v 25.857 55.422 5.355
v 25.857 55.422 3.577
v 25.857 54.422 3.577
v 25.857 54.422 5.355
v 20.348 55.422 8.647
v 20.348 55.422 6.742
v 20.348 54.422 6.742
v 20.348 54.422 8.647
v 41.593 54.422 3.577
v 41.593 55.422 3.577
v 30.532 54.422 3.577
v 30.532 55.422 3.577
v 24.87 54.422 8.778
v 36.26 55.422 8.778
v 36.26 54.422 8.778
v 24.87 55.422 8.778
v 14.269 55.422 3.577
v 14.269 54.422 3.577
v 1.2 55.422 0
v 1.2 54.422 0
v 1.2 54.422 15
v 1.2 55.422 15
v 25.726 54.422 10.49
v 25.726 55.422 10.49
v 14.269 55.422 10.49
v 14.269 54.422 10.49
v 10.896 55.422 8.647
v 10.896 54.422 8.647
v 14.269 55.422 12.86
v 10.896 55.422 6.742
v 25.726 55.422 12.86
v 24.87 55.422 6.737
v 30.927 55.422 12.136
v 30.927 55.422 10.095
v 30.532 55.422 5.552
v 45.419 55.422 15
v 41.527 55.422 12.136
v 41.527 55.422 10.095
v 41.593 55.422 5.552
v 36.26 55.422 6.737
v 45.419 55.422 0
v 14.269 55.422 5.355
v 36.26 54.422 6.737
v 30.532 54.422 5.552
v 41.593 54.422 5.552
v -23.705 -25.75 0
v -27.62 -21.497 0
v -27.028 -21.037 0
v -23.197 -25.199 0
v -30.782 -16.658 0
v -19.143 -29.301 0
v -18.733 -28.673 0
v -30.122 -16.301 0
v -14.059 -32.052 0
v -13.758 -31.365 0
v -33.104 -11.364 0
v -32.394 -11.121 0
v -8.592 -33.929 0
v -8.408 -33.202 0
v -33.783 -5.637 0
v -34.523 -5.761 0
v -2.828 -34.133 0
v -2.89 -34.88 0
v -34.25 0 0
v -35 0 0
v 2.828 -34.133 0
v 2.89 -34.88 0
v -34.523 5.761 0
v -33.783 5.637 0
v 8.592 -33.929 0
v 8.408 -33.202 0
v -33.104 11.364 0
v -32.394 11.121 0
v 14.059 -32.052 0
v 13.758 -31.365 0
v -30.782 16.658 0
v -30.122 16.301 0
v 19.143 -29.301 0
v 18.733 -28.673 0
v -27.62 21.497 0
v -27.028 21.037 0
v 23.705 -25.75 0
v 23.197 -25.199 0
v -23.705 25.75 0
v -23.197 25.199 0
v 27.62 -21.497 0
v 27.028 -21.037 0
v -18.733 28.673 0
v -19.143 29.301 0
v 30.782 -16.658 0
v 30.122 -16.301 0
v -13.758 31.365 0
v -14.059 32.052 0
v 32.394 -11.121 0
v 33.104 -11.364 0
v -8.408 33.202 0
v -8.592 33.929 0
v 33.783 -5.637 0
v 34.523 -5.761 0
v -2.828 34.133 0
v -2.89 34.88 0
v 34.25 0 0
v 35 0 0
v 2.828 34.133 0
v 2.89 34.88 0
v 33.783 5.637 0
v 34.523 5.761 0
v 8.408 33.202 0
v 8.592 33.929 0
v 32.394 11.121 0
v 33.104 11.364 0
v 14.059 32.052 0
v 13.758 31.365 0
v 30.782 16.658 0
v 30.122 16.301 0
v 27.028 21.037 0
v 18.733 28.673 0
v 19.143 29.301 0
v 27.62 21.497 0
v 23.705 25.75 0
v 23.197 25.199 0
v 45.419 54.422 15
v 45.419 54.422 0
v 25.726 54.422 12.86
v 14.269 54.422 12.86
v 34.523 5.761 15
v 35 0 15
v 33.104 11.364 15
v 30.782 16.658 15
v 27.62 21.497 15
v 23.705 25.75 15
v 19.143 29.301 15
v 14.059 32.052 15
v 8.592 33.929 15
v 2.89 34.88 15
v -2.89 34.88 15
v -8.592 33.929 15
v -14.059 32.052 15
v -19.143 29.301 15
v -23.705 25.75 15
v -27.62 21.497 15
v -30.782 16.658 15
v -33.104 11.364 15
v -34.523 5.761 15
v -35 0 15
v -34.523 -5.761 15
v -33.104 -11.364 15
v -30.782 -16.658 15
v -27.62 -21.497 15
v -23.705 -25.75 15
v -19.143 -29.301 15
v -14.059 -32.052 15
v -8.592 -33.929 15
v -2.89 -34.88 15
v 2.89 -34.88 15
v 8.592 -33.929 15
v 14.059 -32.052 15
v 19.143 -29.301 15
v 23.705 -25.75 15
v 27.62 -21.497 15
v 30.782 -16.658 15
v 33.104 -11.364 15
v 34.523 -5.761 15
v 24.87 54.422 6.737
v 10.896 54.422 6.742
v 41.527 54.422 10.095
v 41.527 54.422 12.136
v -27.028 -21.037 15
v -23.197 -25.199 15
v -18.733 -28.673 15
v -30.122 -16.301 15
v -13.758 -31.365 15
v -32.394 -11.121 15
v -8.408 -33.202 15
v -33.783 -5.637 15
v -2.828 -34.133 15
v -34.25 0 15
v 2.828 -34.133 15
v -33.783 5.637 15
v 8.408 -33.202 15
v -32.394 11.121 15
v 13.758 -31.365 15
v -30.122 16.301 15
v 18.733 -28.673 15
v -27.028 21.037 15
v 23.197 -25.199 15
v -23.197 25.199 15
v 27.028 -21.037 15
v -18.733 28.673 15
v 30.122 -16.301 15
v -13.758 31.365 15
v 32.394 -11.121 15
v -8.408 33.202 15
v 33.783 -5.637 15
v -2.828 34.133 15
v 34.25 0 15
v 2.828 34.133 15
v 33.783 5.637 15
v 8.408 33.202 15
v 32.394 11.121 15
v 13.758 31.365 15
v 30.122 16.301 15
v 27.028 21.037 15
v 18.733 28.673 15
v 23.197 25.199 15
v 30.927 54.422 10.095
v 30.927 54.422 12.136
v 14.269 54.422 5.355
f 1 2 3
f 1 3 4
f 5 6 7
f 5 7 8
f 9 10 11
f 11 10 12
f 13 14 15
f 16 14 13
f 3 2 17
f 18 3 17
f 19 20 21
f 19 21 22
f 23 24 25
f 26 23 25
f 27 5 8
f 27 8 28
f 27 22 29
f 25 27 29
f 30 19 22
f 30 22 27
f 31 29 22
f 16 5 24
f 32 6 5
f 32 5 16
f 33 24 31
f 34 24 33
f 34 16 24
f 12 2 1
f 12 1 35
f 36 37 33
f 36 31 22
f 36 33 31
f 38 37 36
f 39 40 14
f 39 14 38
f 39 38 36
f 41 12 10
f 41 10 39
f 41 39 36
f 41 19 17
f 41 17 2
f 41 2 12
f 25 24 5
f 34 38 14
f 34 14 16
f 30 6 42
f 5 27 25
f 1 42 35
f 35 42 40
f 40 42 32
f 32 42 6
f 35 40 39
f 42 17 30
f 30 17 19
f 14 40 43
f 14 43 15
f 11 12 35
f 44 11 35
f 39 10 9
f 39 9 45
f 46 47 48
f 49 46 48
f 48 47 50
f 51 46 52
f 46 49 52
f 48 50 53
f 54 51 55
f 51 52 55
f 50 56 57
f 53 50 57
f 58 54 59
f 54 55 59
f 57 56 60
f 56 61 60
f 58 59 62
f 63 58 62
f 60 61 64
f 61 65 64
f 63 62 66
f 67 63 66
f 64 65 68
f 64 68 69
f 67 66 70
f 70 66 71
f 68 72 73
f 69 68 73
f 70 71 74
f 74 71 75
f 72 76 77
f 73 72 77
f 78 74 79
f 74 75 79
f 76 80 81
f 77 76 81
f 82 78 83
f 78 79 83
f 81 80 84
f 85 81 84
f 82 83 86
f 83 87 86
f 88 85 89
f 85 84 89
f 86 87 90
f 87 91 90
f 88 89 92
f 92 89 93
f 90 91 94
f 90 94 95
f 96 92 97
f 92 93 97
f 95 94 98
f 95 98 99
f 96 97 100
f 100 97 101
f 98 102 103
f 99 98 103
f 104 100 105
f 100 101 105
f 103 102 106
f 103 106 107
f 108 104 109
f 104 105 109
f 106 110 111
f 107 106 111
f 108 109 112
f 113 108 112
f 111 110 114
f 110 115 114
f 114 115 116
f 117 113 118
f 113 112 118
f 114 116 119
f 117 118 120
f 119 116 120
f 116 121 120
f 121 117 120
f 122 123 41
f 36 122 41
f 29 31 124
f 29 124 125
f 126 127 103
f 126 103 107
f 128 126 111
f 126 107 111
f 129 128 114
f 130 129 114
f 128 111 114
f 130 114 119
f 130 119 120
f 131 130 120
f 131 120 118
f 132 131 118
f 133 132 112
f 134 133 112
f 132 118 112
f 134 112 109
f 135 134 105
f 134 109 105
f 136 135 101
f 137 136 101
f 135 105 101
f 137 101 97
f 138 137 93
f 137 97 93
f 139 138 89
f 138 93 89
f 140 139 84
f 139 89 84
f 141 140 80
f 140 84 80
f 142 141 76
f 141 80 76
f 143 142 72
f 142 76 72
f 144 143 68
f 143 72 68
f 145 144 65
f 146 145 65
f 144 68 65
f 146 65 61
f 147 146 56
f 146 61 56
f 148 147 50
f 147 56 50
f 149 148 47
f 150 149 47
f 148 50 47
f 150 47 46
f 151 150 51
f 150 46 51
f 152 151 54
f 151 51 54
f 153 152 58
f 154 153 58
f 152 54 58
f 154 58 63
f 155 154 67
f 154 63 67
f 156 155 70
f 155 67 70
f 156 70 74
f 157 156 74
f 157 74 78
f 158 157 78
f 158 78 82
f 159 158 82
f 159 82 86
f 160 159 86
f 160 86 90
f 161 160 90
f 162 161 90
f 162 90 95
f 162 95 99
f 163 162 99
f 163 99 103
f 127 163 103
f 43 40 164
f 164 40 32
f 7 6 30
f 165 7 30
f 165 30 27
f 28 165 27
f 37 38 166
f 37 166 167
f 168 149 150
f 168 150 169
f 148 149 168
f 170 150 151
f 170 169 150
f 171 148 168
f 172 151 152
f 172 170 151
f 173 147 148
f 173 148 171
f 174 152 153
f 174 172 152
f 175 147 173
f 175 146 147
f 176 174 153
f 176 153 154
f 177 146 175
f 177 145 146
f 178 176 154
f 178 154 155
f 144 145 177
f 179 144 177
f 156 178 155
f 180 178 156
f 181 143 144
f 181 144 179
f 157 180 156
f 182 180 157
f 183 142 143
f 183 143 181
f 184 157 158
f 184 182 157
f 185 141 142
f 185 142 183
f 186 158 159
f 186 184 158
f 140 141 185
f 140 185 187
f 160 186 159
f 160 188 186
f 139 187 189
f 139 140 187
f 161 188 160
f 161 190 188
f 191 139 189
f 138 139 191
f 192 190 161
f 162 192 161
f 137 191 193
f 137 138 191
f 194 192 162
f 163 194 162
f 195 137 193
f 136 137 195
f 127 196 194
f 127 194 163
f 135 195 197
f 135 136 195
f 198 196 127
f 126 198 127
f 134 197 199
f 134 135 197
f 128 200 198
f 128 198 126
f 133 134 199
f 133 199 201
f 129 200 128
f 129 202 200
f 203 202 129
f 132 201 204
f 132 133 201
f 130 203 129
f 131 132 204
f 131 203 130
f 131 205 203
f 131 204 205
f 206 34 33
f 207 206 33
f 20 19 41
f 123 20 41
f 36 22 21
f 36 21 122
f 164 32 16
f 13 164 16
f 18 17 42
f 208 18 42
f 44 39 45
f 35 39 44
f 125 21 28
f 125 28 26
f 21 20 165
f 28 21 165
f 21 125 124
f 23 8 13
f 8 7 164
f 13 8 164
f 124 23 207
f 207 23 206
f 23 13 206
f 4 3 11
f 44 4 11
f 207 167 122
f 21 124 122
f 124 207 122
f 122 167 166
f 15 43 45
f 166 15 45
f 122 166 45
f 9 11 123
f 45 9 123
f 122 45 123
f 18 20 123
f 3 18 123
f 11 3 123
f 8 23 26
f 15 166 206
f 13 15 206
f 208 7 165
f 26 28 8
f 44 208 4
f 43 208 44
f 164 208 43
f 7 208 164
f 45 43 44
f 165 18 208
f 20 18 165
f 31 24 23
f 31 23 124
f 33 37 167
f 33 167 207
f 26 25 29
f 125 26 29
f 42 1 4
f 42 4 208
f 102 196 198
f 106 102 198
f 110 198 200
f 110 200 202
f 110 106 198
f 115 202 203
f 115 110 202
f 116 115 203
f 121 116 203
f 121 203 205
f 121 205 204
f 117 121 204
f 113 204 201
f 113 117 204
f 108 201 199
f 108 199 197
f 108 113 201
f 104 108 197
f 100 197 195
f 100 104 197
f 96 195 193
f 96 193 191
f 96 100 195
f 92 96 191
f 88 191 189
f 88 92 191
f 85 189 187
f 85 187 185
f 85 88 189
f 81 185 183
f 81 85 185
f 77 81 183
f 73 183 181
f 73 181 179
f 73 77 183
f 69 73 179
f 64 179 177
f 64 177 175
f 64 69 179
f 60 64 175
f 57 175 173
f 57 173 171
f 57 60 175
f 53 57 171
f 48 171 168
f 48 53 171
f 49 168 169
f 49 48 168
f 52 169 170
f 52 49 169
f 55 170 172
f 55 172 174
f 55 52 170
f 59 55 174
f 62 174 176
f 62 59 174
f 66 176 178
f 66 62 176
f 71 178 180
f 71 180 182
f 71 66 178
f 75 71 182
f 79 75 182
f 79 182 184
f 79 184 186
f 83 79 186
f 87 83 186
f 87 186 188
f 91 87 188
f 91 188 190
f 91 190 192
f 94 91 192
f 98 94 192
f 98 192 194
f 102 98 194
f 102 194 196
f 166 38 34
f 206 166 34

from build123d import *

# Parameters (mm, degrees)
F0_R     = 35
F0_R_2   = 34.25
F1_DEPTH = 15
F2_W     = 44.219401
F2_H     = 1
F3_DEPTH = 15
F4_W     = 44.219401
F4_H     = 15
F4_W_2   = 11.061309
F4_H_2   = 1.975235
F4_W_3   = 11.58804
F4_H_3   = 1.777711
F4_W_4   = 10.600423
F4_H_4   = 2.041075
F4_W_5   = 11.390517
F4_W_6   = 9.451392
F4_H_5   = 1.904932
F4_W_7   = 11.456358
F4_H_6   = 2.37028
F5_DEPTH = 2


with BuildPart() as f1:
    # F0 (on Top) → F1 (new body)
    with BuildSketch(Plane.XY):
        Circle(F0_R)
        Circle(F0_R_2, mode=Mode.SUBTRACT)
    extrude(amount=F1_DEPTH)


with BuildPart() as f3:
    # F2 (on Top) → F3 (new body)
    with BuildSketch(Plane.XY):
        with Locations((23.309262, 54.921625)):
            Rectangle(F2_W, F2_H)
    extrude(amount=F3_DEPTH)

    # F4 (on face) → F5 (intersect)
    with BuildSketch(Plane(origin=(0, 55.421625, 0), x_dir=(-1, 0, 0), z_dir=(0, 1, 0))):
        with Locations((-23.309262, 7.5)):
            Rectangle(F4_W, F4_H)
        with Locations((-36.062576, 4.564508)):
            Rectangle(F4_W_2, F4_H_2, mode=Mode.SUBTRACT)
        with Locations((-20.063183, 4.465746)):
            Rectangle(F4_W_3, F4_H_3, mode=Mode.SUBTRACT)
        with Locations((-36.227182, 11.115702)):
            Rectangle(F4_W_4, F4_H_4, mode=Mode.SUBTRACT)
        with Locations((-30.564843, 7.757803)):
            Rectangle(F4_W_5, F4_H_4, mode=Mode.SUBTRACT)
        with Locations((-15.621856, 7.694377)):
            Rectangle(F4_W_6, F4_H_5, mode=Mode.SUBTRACT)
        with Locations((-19.997342, 11.675351)):
            Rectangle(F4_W_7, F4_H_6, mode=Mode.SUBTRACT)
    extrude(amount=-F5_DEPTH, mode=Mode.INTERSECT)


solid = Compound([f1.part, f3.part])
